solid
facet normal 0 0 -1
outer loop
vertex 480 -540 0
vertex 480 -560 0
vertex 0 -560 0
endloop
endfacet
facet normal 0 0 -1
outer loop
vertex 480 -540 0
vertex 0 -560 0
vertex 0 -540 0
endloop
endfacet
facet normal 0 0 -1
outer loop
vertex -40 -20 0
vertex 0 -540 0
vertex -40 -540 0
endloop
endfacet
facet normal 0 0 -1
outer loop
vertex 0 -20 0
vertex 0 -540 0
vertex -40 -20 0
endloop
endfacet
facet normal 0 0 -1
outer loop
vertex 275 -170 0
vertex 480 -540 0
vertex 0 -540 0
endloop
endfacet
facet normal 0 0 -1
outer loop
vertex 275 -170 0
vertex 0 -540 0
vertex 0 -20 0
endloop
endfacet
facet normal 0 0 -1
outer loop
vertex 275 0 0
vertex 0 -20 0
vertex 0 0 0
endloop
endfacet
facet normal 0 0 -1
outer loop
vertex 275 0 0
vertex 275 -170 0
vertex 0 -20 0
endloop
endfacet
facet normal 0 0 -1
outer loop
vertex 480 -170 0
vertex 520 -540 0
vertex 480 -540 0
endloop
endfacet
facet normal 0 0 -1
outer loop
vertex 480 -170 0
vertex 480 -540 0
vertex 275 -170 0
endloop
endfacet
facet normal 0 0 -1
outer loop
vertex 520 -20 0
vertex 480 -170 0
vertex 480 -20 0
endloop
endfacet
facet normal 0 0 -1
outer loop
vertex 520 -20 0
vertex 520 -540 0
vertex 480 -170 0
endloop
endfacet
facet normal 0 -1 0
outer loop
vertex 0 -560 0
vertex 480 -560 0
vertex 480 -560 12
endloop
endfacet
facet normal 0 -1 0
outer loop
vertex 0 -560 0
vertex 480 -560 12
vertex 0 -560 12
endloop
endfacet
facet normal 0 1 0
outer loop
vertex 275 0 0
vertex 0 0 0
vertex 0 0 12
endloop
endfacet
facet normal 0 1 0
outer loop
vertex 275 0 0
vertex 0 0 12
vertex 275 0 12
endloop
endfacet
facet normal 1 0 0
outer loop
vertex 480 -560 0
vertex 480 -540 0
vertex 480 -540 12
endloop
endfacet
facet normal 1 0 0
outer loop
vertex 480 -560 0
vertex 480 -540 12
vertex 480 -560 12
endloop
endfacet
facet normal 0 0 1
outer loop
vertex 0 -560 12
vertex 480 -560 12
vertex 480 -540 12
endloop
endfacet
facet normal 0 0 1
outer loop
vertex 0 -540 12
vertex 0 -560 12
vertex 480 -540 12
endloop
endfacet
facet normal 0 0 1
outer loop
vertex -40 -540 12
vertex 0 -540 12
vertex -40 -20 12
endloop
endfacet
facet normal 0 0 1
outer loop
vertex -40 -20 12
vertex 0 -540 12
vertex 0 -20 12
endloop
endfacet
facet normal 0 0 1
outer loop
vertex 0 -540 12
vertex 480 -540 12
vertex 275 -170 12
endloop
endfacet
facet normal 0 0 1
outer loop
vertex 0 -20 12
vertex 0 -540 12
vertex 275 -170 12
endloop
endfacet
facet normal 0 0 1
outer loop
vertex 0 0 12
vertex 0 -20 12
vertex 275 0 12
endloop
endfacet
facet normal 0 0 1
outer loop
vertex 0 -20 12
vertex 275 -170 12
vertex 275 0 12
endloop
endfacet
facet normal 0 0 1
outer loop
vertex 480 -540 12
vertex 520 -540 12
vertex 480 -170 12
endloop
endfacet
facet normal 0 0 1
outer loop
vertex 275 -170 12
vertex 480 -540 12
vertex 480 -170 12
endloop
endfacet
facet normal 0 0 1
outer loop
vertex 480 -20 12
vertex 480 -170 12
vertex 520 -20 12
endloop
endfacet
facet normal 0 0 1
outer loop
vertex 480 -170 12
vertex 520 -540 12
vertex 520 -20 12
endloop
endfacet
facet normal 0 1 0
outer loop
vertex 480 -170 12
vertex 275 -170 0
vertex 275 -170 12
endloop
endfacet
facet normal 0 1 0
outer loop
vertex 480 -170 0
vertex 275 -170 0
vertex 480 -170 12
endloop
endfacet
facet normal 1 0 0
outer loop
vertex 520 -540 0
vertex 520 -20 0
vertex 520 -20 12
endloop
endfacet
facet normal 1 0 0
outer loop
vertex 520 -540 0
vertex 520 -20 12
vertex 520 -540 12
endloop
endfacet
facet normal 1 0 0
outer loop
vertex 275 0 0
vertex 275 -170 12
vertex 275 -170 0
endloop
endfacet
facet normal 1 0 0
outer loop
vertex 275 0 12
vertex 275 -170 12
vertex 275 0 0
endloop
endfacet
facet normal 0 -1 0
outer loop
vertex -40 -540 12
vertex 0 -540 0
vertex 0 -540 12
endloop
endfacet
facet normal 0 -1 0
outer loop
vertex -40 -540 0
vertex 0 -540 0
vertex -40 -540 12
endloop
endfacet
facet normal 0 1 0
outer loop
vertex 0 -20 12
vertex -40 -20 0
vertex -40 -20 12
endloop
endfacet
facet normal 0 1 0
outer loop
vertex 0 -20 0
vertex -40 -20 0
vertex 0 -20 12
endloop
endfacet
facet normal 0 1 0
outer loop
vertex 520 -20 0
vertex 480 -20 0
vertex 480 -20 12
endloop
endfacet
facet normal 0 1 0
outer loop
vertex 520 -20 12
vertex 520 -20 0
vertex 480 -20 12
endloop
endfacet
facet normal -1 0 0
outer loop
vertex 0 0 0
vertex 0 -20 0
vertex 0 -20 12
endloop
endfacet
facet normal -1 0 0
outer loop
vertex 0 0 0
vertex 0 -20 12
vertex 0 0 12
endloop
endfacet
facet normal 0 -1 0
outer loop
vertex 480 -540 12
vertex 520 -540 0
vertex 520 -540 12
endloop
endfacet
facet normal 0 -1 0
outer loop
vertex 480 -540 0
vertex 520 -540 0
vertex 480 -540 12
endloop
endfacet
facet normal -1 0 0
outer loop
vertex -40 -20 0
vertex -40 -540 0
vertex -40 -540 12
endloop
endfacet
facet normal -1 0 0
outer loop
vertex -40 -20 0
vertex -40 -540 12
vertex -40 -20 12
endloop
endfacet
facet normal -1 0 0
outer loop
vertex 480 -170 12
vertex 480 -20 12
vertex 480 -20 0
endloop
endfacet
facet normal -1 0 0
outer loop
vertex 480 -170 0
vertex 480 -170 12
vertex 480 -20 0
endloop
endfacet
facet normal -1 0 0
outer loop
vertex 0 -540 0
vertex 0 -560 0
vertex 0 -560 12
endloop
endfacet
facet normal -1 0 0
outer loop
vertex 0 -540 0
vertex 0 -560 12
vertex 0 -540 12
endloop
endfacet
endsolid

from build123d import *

# Parameters (mm, degrees)
EXTRUDE_1_DEPTH     = 12
SKETCH_3_W          = 205
SKETCH_3_H          = 170
CUT_EXTRUDE_2_DEPTH = 12
SKETCH_4_W          = 12
SKETCH_4_H          = 150
EXTRUDE_2_DEPTH     = 2
SKETCH_5_W          = 2
SKETCH_5_H          = 12
CUT_EXTRUDE_3_DEPTH = 150


with BuildPart() as part:
    # ｽｹｯﾁ1 → ﾎﾞｽ - 押し出し1 (new body)
    with BuildSketch(Plane.XY):
        Polygon((0, 0), (480, 0), (480, -20), (520, -20), (520, -540), (480, -540), (480, -560), (0, -560), (0, -540), (-40, -540), (-40, -20), (0, -20), align=None)
    extrude(amount=EXTRUDE_1_DEPTH)

    # ｽｹｯﾁ3 → ｶｯﾄ - 押し出し2 (cut)
    with BuildSketch(Plane.XY.offset(12)):
        with Locations((377.5, -85)):
            Rectangle(SKETCH_3_W, SKETCH_3_H)
    extrude(amount=-CUT_EXTRUDE_2_DEPTH, mode=Mode.SUBTRACT)

    # ｽｹｯﾁ4 → ﾎﾞｽ - 押し出し2 (add)
    with BuildSketch(Plane.ZY.offset(-480)):
        with Locations((6, -95)):
            Rectangle(SKETCH_4_W, SKETCH_4_H)
    extrude(amount=EXTRUDE_2_DEPTH)

    # ｽｹｯﾁ5 → ｶｯﾄ - 押し出し3 (cut)
    with BuildSketch(Plane(origin=(0, -20, 0), x_dir=(1, 0, 0), z_dir=(0, 1, 0))):
        with Locations((479, -6)):
            Rectangle(SKETCH_5_W, SKETCH_5_H)
    extrude(amount=-CUT_EXTRUDE_3_DEPTH, mode=Mode.SUBTRACT)


solid = part.part
